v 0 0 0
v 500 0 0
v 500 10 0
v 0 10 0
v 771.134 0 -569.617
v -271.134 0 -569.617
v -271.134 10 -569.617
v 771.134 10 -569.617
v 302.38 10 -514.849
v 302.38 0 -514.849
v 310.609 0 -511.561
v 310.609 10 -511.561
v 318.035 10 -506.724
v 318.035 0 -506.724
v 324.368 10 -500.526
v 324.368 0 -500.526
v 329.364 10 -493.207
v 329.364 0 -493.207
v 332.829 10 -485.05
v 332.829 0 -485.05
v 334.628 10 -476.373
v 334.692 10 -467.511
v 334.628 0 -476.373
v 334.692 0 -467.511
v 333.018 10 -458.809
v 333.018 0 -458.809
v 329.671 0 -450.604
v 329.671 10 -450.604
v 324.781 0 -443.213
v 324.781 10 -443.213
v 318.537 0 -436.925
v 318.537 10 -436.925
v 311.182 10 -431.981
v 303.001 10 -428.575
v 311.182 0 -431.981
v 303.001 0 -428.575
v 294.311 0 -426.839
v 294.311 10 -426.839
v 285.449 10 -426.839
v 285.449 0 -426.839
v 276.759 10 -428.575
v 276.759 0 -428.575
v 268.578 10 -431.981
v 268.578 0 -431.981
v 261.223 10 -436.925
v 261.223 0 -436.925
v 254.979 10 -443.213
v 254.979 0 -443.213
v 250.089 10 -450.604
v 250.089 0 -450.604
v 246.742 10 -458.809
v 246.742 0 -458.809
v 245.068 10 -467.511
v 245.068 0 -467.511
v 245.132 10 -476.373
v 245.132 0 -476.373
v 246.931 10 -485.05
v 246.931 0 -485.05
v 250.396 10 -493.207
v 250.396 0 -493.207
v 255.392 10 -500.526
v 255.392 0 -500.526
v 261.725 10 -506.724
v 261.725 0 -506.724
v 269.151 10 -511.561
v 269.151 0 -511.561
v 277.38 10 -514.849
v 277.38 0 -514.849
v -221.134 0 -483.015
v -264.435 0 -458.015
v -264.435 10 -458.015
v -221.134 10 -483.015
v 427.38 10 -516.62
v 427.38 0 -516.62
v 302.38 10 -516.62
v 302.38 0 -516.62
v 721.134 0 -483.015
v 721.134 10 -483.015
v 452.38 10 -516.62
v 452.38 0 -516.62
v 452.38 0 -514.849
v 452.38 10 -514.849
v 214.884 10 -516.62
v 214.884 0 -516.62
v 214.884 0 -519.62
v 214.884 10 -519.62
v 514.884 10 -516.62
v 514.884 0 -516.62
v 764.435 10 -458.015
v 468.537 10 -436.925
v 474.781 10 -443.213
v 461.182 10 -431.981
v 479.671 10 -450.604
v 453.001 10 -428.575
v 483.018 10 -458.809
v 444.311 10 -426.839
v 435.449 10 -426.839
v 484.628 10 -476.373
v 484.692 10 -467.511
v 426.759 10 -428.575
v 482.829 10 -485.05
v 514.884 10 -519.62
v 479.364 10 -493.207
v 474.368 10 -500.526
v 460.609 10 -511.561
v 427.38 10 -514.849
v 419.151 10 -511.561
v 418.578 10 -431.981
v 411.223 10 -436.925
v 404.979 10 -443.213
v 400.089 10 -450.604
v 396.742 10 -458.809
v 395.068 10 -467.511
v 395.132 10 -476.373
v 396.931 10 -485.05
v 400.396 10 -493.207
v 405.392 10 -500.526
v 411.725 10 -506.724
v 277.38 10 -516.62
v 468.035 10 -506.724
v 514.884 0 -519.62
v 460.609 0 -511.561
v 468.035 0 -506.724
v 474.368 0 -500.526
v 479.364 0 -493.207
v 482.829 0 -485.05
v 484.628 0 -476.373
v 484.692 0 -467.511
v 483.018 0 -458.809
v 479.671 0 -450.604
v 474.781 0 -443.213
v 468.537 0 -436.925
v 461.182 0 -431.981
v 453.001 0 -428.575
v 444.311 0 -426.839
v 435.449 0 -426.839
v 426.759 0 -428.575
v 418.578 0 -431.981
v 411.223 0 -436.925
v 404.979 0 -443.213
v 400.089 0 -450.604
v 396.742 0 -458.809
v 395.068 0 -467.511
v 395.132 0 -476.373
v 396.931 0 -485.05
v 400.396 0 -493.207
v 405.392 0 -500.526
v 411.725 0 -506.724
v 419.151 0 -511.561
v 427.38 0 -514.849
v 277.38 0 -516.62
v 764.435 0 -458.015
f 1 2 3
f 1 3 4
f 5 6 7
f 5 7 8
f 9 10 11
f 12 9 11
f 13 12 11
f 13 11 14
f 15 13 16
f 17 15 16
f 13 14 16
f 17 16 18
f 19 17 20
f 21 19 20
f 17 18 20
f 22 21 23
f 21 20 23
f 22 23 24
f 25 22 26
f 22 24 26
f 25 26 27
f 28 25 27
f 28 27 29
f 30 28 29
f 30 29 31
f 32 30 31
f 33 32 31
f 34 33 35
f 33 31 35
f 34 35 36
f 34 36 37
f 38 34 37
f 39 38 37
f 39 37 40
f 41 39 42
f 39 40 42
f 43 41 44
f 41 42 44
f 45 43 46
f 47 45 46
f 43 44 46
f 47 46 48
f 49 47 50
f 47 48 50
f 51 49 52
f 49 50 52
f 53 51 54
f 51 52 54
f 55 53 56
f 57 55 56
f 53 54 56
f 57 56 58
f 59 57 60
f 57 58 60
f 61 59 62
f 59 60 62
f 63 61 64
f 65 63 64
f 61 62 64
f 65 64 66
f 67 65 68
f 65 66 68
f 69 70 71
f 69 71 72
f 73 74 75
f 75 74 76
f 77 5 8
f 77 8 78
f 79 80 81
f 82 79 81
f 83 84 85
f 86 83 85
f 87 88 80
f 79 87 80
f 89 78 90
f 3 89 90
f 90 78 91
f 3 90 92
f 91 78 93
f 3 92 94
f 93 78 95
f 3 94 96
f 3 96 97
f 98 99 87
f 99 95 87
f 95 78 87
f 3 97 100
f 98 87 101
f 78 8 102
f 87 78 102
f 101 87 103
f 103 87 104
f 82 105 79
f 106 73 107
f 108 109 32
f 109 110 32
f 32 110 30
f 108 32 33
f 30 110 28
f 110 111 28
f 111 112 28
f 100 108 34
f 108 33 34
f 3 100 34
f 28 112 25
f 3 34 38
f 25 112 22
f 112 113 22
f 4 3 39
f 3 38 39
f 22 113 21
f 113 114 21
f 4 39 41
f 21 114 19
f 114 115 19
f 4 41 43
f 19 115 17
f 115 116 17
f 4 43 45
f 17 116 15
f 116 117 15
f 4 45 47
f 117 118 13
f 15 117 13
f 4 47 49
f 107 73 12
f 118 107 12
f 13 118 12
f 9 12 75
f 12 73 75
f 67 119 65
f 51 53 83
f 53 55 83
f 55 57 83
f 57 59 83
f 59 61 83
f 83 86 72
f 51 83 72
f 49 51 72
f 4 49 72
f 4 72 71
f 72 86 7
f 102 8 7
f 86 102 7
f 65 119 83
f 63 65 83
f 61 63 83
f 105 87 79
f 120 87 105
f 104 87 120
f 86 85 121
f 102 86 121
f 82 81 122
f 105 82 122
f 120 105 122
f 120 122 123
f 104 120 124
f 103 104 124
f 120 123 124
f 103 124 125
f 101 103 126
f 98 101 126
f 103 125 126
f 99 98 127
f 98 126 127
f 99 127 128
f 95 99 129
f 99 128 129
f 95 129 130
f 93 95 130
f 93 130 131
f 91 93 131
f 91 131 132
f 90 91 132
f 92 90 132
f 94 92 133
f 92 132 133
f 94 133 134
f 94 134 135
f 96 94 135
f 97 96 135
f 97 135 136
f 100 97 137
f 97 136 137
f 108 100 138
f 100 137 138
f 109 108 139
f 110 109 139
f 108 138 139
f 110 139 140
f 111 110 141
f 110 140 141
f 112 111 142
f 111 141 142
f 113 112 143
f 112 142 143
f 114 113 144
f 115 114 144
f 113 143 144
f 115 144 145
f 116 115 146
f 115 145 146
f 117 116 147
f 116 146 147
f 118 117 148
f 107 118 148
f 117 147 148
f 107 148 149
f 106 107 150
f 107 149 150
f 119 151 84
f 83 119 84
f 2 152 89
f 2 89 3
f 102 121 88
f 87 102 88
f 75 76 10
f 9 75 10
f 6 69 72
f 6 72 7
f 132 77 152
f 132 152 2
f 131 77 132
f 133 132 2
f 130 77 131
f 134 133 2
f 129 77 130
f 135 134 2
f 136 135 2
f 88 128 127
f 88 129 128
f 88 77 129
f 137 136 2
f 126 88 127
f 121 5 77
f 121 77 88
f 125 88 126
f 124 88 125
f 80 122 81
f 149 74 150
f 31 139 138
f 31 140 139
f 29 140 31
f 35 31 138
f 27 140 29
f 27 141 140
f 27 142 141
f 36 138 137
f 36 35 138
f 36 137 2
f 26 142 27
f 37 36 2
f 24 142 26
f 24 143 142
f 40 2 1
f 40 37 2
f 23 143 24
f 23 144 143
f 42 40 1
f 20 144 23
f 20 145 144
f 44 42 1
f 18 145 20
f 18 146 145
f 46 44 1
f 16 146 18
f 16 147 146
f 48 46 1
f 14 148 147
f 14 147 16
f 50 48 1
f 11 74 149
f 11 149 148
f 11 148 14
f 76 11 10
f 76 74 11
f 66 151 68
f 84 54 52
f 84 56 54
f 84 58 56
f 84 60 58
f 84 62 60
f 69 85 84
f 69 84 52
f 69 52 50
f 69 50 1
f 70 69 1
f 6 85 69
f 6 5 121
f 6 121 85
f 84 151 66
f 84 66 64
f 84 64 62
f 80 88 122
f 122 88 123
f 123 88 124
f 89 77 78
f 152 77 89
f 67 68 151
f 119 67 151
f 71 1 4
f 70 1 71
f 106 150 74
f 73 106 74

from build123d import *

# Parameters (mm, degrees)
BOSS_EXTRUDE1_DEPTH = 10
CUT_EXTRUDE6_DEPTH  = 10


with BuildPart() as part:
    # Sketch1 → Boss-Extrude1 (new body)
    with BuildSketch(Plane(origin=(0, 0, 0), x_dir=(1, 0, 0), z_dir=(0, 1, 0))):
        Polygon((-271.133729811, 569.617395678), (771.133729811, 569.617395678), (721.133729811, 483.014855299), (764.435, 458.014855299), (500, 0), (0, 0), (-264.435, 458.014855299), (-221.133729811, 483.014855299), align=None)
    extrude(amount=BOSS_EXTRUDE1_DEPTH)

    # Sketch2 → Cut-Extrude6 (cut)
    with BuildSketch(Plane(origin=(0, 0, 0), x_dir=(-1, 0, 0), z_dir=(0, -1, 0))):
        with BuildLine():
            Line((-514.883729811, 519.62), (-514.883729811, 516.62))
            Line((-514.883729811, 516.62), (-452.38, 516.62))
            Line((-452.38, 516.62), (-452.38, 514.849041164))
            ThreePointArc((-452.38, 514.849041164), (-439.88, 426.62), (-427.38, 514.849041164))
            Line((-427.38, 514.849041164), (-427.38, 516.62))
            Line((-427.38, 516.62), (-302.38, 516.62))
            Line((-302.38, 516.62), (-302.38, 514.849041164))
            ThreePointArc((-302.38, 514.849041164), (-289.88, 426.62), (-277.38, 514.849041164))
            Line((-277.38, 514.849041164), (-277.38, 516.62))
            Line((-277.38, 516.62), (-214.883729811, 516.62))
            Line((-214.883729811, 516.62), (-214.883729811, 519.62))
            Line((-214.883729811, 519.62), (-514.883729811, 519.62))
        make_face()
    extrude(amount=-CUT_EXTRUDE6_DEPTH, mode=Mode.SUBTRACT)


solid = part.part
